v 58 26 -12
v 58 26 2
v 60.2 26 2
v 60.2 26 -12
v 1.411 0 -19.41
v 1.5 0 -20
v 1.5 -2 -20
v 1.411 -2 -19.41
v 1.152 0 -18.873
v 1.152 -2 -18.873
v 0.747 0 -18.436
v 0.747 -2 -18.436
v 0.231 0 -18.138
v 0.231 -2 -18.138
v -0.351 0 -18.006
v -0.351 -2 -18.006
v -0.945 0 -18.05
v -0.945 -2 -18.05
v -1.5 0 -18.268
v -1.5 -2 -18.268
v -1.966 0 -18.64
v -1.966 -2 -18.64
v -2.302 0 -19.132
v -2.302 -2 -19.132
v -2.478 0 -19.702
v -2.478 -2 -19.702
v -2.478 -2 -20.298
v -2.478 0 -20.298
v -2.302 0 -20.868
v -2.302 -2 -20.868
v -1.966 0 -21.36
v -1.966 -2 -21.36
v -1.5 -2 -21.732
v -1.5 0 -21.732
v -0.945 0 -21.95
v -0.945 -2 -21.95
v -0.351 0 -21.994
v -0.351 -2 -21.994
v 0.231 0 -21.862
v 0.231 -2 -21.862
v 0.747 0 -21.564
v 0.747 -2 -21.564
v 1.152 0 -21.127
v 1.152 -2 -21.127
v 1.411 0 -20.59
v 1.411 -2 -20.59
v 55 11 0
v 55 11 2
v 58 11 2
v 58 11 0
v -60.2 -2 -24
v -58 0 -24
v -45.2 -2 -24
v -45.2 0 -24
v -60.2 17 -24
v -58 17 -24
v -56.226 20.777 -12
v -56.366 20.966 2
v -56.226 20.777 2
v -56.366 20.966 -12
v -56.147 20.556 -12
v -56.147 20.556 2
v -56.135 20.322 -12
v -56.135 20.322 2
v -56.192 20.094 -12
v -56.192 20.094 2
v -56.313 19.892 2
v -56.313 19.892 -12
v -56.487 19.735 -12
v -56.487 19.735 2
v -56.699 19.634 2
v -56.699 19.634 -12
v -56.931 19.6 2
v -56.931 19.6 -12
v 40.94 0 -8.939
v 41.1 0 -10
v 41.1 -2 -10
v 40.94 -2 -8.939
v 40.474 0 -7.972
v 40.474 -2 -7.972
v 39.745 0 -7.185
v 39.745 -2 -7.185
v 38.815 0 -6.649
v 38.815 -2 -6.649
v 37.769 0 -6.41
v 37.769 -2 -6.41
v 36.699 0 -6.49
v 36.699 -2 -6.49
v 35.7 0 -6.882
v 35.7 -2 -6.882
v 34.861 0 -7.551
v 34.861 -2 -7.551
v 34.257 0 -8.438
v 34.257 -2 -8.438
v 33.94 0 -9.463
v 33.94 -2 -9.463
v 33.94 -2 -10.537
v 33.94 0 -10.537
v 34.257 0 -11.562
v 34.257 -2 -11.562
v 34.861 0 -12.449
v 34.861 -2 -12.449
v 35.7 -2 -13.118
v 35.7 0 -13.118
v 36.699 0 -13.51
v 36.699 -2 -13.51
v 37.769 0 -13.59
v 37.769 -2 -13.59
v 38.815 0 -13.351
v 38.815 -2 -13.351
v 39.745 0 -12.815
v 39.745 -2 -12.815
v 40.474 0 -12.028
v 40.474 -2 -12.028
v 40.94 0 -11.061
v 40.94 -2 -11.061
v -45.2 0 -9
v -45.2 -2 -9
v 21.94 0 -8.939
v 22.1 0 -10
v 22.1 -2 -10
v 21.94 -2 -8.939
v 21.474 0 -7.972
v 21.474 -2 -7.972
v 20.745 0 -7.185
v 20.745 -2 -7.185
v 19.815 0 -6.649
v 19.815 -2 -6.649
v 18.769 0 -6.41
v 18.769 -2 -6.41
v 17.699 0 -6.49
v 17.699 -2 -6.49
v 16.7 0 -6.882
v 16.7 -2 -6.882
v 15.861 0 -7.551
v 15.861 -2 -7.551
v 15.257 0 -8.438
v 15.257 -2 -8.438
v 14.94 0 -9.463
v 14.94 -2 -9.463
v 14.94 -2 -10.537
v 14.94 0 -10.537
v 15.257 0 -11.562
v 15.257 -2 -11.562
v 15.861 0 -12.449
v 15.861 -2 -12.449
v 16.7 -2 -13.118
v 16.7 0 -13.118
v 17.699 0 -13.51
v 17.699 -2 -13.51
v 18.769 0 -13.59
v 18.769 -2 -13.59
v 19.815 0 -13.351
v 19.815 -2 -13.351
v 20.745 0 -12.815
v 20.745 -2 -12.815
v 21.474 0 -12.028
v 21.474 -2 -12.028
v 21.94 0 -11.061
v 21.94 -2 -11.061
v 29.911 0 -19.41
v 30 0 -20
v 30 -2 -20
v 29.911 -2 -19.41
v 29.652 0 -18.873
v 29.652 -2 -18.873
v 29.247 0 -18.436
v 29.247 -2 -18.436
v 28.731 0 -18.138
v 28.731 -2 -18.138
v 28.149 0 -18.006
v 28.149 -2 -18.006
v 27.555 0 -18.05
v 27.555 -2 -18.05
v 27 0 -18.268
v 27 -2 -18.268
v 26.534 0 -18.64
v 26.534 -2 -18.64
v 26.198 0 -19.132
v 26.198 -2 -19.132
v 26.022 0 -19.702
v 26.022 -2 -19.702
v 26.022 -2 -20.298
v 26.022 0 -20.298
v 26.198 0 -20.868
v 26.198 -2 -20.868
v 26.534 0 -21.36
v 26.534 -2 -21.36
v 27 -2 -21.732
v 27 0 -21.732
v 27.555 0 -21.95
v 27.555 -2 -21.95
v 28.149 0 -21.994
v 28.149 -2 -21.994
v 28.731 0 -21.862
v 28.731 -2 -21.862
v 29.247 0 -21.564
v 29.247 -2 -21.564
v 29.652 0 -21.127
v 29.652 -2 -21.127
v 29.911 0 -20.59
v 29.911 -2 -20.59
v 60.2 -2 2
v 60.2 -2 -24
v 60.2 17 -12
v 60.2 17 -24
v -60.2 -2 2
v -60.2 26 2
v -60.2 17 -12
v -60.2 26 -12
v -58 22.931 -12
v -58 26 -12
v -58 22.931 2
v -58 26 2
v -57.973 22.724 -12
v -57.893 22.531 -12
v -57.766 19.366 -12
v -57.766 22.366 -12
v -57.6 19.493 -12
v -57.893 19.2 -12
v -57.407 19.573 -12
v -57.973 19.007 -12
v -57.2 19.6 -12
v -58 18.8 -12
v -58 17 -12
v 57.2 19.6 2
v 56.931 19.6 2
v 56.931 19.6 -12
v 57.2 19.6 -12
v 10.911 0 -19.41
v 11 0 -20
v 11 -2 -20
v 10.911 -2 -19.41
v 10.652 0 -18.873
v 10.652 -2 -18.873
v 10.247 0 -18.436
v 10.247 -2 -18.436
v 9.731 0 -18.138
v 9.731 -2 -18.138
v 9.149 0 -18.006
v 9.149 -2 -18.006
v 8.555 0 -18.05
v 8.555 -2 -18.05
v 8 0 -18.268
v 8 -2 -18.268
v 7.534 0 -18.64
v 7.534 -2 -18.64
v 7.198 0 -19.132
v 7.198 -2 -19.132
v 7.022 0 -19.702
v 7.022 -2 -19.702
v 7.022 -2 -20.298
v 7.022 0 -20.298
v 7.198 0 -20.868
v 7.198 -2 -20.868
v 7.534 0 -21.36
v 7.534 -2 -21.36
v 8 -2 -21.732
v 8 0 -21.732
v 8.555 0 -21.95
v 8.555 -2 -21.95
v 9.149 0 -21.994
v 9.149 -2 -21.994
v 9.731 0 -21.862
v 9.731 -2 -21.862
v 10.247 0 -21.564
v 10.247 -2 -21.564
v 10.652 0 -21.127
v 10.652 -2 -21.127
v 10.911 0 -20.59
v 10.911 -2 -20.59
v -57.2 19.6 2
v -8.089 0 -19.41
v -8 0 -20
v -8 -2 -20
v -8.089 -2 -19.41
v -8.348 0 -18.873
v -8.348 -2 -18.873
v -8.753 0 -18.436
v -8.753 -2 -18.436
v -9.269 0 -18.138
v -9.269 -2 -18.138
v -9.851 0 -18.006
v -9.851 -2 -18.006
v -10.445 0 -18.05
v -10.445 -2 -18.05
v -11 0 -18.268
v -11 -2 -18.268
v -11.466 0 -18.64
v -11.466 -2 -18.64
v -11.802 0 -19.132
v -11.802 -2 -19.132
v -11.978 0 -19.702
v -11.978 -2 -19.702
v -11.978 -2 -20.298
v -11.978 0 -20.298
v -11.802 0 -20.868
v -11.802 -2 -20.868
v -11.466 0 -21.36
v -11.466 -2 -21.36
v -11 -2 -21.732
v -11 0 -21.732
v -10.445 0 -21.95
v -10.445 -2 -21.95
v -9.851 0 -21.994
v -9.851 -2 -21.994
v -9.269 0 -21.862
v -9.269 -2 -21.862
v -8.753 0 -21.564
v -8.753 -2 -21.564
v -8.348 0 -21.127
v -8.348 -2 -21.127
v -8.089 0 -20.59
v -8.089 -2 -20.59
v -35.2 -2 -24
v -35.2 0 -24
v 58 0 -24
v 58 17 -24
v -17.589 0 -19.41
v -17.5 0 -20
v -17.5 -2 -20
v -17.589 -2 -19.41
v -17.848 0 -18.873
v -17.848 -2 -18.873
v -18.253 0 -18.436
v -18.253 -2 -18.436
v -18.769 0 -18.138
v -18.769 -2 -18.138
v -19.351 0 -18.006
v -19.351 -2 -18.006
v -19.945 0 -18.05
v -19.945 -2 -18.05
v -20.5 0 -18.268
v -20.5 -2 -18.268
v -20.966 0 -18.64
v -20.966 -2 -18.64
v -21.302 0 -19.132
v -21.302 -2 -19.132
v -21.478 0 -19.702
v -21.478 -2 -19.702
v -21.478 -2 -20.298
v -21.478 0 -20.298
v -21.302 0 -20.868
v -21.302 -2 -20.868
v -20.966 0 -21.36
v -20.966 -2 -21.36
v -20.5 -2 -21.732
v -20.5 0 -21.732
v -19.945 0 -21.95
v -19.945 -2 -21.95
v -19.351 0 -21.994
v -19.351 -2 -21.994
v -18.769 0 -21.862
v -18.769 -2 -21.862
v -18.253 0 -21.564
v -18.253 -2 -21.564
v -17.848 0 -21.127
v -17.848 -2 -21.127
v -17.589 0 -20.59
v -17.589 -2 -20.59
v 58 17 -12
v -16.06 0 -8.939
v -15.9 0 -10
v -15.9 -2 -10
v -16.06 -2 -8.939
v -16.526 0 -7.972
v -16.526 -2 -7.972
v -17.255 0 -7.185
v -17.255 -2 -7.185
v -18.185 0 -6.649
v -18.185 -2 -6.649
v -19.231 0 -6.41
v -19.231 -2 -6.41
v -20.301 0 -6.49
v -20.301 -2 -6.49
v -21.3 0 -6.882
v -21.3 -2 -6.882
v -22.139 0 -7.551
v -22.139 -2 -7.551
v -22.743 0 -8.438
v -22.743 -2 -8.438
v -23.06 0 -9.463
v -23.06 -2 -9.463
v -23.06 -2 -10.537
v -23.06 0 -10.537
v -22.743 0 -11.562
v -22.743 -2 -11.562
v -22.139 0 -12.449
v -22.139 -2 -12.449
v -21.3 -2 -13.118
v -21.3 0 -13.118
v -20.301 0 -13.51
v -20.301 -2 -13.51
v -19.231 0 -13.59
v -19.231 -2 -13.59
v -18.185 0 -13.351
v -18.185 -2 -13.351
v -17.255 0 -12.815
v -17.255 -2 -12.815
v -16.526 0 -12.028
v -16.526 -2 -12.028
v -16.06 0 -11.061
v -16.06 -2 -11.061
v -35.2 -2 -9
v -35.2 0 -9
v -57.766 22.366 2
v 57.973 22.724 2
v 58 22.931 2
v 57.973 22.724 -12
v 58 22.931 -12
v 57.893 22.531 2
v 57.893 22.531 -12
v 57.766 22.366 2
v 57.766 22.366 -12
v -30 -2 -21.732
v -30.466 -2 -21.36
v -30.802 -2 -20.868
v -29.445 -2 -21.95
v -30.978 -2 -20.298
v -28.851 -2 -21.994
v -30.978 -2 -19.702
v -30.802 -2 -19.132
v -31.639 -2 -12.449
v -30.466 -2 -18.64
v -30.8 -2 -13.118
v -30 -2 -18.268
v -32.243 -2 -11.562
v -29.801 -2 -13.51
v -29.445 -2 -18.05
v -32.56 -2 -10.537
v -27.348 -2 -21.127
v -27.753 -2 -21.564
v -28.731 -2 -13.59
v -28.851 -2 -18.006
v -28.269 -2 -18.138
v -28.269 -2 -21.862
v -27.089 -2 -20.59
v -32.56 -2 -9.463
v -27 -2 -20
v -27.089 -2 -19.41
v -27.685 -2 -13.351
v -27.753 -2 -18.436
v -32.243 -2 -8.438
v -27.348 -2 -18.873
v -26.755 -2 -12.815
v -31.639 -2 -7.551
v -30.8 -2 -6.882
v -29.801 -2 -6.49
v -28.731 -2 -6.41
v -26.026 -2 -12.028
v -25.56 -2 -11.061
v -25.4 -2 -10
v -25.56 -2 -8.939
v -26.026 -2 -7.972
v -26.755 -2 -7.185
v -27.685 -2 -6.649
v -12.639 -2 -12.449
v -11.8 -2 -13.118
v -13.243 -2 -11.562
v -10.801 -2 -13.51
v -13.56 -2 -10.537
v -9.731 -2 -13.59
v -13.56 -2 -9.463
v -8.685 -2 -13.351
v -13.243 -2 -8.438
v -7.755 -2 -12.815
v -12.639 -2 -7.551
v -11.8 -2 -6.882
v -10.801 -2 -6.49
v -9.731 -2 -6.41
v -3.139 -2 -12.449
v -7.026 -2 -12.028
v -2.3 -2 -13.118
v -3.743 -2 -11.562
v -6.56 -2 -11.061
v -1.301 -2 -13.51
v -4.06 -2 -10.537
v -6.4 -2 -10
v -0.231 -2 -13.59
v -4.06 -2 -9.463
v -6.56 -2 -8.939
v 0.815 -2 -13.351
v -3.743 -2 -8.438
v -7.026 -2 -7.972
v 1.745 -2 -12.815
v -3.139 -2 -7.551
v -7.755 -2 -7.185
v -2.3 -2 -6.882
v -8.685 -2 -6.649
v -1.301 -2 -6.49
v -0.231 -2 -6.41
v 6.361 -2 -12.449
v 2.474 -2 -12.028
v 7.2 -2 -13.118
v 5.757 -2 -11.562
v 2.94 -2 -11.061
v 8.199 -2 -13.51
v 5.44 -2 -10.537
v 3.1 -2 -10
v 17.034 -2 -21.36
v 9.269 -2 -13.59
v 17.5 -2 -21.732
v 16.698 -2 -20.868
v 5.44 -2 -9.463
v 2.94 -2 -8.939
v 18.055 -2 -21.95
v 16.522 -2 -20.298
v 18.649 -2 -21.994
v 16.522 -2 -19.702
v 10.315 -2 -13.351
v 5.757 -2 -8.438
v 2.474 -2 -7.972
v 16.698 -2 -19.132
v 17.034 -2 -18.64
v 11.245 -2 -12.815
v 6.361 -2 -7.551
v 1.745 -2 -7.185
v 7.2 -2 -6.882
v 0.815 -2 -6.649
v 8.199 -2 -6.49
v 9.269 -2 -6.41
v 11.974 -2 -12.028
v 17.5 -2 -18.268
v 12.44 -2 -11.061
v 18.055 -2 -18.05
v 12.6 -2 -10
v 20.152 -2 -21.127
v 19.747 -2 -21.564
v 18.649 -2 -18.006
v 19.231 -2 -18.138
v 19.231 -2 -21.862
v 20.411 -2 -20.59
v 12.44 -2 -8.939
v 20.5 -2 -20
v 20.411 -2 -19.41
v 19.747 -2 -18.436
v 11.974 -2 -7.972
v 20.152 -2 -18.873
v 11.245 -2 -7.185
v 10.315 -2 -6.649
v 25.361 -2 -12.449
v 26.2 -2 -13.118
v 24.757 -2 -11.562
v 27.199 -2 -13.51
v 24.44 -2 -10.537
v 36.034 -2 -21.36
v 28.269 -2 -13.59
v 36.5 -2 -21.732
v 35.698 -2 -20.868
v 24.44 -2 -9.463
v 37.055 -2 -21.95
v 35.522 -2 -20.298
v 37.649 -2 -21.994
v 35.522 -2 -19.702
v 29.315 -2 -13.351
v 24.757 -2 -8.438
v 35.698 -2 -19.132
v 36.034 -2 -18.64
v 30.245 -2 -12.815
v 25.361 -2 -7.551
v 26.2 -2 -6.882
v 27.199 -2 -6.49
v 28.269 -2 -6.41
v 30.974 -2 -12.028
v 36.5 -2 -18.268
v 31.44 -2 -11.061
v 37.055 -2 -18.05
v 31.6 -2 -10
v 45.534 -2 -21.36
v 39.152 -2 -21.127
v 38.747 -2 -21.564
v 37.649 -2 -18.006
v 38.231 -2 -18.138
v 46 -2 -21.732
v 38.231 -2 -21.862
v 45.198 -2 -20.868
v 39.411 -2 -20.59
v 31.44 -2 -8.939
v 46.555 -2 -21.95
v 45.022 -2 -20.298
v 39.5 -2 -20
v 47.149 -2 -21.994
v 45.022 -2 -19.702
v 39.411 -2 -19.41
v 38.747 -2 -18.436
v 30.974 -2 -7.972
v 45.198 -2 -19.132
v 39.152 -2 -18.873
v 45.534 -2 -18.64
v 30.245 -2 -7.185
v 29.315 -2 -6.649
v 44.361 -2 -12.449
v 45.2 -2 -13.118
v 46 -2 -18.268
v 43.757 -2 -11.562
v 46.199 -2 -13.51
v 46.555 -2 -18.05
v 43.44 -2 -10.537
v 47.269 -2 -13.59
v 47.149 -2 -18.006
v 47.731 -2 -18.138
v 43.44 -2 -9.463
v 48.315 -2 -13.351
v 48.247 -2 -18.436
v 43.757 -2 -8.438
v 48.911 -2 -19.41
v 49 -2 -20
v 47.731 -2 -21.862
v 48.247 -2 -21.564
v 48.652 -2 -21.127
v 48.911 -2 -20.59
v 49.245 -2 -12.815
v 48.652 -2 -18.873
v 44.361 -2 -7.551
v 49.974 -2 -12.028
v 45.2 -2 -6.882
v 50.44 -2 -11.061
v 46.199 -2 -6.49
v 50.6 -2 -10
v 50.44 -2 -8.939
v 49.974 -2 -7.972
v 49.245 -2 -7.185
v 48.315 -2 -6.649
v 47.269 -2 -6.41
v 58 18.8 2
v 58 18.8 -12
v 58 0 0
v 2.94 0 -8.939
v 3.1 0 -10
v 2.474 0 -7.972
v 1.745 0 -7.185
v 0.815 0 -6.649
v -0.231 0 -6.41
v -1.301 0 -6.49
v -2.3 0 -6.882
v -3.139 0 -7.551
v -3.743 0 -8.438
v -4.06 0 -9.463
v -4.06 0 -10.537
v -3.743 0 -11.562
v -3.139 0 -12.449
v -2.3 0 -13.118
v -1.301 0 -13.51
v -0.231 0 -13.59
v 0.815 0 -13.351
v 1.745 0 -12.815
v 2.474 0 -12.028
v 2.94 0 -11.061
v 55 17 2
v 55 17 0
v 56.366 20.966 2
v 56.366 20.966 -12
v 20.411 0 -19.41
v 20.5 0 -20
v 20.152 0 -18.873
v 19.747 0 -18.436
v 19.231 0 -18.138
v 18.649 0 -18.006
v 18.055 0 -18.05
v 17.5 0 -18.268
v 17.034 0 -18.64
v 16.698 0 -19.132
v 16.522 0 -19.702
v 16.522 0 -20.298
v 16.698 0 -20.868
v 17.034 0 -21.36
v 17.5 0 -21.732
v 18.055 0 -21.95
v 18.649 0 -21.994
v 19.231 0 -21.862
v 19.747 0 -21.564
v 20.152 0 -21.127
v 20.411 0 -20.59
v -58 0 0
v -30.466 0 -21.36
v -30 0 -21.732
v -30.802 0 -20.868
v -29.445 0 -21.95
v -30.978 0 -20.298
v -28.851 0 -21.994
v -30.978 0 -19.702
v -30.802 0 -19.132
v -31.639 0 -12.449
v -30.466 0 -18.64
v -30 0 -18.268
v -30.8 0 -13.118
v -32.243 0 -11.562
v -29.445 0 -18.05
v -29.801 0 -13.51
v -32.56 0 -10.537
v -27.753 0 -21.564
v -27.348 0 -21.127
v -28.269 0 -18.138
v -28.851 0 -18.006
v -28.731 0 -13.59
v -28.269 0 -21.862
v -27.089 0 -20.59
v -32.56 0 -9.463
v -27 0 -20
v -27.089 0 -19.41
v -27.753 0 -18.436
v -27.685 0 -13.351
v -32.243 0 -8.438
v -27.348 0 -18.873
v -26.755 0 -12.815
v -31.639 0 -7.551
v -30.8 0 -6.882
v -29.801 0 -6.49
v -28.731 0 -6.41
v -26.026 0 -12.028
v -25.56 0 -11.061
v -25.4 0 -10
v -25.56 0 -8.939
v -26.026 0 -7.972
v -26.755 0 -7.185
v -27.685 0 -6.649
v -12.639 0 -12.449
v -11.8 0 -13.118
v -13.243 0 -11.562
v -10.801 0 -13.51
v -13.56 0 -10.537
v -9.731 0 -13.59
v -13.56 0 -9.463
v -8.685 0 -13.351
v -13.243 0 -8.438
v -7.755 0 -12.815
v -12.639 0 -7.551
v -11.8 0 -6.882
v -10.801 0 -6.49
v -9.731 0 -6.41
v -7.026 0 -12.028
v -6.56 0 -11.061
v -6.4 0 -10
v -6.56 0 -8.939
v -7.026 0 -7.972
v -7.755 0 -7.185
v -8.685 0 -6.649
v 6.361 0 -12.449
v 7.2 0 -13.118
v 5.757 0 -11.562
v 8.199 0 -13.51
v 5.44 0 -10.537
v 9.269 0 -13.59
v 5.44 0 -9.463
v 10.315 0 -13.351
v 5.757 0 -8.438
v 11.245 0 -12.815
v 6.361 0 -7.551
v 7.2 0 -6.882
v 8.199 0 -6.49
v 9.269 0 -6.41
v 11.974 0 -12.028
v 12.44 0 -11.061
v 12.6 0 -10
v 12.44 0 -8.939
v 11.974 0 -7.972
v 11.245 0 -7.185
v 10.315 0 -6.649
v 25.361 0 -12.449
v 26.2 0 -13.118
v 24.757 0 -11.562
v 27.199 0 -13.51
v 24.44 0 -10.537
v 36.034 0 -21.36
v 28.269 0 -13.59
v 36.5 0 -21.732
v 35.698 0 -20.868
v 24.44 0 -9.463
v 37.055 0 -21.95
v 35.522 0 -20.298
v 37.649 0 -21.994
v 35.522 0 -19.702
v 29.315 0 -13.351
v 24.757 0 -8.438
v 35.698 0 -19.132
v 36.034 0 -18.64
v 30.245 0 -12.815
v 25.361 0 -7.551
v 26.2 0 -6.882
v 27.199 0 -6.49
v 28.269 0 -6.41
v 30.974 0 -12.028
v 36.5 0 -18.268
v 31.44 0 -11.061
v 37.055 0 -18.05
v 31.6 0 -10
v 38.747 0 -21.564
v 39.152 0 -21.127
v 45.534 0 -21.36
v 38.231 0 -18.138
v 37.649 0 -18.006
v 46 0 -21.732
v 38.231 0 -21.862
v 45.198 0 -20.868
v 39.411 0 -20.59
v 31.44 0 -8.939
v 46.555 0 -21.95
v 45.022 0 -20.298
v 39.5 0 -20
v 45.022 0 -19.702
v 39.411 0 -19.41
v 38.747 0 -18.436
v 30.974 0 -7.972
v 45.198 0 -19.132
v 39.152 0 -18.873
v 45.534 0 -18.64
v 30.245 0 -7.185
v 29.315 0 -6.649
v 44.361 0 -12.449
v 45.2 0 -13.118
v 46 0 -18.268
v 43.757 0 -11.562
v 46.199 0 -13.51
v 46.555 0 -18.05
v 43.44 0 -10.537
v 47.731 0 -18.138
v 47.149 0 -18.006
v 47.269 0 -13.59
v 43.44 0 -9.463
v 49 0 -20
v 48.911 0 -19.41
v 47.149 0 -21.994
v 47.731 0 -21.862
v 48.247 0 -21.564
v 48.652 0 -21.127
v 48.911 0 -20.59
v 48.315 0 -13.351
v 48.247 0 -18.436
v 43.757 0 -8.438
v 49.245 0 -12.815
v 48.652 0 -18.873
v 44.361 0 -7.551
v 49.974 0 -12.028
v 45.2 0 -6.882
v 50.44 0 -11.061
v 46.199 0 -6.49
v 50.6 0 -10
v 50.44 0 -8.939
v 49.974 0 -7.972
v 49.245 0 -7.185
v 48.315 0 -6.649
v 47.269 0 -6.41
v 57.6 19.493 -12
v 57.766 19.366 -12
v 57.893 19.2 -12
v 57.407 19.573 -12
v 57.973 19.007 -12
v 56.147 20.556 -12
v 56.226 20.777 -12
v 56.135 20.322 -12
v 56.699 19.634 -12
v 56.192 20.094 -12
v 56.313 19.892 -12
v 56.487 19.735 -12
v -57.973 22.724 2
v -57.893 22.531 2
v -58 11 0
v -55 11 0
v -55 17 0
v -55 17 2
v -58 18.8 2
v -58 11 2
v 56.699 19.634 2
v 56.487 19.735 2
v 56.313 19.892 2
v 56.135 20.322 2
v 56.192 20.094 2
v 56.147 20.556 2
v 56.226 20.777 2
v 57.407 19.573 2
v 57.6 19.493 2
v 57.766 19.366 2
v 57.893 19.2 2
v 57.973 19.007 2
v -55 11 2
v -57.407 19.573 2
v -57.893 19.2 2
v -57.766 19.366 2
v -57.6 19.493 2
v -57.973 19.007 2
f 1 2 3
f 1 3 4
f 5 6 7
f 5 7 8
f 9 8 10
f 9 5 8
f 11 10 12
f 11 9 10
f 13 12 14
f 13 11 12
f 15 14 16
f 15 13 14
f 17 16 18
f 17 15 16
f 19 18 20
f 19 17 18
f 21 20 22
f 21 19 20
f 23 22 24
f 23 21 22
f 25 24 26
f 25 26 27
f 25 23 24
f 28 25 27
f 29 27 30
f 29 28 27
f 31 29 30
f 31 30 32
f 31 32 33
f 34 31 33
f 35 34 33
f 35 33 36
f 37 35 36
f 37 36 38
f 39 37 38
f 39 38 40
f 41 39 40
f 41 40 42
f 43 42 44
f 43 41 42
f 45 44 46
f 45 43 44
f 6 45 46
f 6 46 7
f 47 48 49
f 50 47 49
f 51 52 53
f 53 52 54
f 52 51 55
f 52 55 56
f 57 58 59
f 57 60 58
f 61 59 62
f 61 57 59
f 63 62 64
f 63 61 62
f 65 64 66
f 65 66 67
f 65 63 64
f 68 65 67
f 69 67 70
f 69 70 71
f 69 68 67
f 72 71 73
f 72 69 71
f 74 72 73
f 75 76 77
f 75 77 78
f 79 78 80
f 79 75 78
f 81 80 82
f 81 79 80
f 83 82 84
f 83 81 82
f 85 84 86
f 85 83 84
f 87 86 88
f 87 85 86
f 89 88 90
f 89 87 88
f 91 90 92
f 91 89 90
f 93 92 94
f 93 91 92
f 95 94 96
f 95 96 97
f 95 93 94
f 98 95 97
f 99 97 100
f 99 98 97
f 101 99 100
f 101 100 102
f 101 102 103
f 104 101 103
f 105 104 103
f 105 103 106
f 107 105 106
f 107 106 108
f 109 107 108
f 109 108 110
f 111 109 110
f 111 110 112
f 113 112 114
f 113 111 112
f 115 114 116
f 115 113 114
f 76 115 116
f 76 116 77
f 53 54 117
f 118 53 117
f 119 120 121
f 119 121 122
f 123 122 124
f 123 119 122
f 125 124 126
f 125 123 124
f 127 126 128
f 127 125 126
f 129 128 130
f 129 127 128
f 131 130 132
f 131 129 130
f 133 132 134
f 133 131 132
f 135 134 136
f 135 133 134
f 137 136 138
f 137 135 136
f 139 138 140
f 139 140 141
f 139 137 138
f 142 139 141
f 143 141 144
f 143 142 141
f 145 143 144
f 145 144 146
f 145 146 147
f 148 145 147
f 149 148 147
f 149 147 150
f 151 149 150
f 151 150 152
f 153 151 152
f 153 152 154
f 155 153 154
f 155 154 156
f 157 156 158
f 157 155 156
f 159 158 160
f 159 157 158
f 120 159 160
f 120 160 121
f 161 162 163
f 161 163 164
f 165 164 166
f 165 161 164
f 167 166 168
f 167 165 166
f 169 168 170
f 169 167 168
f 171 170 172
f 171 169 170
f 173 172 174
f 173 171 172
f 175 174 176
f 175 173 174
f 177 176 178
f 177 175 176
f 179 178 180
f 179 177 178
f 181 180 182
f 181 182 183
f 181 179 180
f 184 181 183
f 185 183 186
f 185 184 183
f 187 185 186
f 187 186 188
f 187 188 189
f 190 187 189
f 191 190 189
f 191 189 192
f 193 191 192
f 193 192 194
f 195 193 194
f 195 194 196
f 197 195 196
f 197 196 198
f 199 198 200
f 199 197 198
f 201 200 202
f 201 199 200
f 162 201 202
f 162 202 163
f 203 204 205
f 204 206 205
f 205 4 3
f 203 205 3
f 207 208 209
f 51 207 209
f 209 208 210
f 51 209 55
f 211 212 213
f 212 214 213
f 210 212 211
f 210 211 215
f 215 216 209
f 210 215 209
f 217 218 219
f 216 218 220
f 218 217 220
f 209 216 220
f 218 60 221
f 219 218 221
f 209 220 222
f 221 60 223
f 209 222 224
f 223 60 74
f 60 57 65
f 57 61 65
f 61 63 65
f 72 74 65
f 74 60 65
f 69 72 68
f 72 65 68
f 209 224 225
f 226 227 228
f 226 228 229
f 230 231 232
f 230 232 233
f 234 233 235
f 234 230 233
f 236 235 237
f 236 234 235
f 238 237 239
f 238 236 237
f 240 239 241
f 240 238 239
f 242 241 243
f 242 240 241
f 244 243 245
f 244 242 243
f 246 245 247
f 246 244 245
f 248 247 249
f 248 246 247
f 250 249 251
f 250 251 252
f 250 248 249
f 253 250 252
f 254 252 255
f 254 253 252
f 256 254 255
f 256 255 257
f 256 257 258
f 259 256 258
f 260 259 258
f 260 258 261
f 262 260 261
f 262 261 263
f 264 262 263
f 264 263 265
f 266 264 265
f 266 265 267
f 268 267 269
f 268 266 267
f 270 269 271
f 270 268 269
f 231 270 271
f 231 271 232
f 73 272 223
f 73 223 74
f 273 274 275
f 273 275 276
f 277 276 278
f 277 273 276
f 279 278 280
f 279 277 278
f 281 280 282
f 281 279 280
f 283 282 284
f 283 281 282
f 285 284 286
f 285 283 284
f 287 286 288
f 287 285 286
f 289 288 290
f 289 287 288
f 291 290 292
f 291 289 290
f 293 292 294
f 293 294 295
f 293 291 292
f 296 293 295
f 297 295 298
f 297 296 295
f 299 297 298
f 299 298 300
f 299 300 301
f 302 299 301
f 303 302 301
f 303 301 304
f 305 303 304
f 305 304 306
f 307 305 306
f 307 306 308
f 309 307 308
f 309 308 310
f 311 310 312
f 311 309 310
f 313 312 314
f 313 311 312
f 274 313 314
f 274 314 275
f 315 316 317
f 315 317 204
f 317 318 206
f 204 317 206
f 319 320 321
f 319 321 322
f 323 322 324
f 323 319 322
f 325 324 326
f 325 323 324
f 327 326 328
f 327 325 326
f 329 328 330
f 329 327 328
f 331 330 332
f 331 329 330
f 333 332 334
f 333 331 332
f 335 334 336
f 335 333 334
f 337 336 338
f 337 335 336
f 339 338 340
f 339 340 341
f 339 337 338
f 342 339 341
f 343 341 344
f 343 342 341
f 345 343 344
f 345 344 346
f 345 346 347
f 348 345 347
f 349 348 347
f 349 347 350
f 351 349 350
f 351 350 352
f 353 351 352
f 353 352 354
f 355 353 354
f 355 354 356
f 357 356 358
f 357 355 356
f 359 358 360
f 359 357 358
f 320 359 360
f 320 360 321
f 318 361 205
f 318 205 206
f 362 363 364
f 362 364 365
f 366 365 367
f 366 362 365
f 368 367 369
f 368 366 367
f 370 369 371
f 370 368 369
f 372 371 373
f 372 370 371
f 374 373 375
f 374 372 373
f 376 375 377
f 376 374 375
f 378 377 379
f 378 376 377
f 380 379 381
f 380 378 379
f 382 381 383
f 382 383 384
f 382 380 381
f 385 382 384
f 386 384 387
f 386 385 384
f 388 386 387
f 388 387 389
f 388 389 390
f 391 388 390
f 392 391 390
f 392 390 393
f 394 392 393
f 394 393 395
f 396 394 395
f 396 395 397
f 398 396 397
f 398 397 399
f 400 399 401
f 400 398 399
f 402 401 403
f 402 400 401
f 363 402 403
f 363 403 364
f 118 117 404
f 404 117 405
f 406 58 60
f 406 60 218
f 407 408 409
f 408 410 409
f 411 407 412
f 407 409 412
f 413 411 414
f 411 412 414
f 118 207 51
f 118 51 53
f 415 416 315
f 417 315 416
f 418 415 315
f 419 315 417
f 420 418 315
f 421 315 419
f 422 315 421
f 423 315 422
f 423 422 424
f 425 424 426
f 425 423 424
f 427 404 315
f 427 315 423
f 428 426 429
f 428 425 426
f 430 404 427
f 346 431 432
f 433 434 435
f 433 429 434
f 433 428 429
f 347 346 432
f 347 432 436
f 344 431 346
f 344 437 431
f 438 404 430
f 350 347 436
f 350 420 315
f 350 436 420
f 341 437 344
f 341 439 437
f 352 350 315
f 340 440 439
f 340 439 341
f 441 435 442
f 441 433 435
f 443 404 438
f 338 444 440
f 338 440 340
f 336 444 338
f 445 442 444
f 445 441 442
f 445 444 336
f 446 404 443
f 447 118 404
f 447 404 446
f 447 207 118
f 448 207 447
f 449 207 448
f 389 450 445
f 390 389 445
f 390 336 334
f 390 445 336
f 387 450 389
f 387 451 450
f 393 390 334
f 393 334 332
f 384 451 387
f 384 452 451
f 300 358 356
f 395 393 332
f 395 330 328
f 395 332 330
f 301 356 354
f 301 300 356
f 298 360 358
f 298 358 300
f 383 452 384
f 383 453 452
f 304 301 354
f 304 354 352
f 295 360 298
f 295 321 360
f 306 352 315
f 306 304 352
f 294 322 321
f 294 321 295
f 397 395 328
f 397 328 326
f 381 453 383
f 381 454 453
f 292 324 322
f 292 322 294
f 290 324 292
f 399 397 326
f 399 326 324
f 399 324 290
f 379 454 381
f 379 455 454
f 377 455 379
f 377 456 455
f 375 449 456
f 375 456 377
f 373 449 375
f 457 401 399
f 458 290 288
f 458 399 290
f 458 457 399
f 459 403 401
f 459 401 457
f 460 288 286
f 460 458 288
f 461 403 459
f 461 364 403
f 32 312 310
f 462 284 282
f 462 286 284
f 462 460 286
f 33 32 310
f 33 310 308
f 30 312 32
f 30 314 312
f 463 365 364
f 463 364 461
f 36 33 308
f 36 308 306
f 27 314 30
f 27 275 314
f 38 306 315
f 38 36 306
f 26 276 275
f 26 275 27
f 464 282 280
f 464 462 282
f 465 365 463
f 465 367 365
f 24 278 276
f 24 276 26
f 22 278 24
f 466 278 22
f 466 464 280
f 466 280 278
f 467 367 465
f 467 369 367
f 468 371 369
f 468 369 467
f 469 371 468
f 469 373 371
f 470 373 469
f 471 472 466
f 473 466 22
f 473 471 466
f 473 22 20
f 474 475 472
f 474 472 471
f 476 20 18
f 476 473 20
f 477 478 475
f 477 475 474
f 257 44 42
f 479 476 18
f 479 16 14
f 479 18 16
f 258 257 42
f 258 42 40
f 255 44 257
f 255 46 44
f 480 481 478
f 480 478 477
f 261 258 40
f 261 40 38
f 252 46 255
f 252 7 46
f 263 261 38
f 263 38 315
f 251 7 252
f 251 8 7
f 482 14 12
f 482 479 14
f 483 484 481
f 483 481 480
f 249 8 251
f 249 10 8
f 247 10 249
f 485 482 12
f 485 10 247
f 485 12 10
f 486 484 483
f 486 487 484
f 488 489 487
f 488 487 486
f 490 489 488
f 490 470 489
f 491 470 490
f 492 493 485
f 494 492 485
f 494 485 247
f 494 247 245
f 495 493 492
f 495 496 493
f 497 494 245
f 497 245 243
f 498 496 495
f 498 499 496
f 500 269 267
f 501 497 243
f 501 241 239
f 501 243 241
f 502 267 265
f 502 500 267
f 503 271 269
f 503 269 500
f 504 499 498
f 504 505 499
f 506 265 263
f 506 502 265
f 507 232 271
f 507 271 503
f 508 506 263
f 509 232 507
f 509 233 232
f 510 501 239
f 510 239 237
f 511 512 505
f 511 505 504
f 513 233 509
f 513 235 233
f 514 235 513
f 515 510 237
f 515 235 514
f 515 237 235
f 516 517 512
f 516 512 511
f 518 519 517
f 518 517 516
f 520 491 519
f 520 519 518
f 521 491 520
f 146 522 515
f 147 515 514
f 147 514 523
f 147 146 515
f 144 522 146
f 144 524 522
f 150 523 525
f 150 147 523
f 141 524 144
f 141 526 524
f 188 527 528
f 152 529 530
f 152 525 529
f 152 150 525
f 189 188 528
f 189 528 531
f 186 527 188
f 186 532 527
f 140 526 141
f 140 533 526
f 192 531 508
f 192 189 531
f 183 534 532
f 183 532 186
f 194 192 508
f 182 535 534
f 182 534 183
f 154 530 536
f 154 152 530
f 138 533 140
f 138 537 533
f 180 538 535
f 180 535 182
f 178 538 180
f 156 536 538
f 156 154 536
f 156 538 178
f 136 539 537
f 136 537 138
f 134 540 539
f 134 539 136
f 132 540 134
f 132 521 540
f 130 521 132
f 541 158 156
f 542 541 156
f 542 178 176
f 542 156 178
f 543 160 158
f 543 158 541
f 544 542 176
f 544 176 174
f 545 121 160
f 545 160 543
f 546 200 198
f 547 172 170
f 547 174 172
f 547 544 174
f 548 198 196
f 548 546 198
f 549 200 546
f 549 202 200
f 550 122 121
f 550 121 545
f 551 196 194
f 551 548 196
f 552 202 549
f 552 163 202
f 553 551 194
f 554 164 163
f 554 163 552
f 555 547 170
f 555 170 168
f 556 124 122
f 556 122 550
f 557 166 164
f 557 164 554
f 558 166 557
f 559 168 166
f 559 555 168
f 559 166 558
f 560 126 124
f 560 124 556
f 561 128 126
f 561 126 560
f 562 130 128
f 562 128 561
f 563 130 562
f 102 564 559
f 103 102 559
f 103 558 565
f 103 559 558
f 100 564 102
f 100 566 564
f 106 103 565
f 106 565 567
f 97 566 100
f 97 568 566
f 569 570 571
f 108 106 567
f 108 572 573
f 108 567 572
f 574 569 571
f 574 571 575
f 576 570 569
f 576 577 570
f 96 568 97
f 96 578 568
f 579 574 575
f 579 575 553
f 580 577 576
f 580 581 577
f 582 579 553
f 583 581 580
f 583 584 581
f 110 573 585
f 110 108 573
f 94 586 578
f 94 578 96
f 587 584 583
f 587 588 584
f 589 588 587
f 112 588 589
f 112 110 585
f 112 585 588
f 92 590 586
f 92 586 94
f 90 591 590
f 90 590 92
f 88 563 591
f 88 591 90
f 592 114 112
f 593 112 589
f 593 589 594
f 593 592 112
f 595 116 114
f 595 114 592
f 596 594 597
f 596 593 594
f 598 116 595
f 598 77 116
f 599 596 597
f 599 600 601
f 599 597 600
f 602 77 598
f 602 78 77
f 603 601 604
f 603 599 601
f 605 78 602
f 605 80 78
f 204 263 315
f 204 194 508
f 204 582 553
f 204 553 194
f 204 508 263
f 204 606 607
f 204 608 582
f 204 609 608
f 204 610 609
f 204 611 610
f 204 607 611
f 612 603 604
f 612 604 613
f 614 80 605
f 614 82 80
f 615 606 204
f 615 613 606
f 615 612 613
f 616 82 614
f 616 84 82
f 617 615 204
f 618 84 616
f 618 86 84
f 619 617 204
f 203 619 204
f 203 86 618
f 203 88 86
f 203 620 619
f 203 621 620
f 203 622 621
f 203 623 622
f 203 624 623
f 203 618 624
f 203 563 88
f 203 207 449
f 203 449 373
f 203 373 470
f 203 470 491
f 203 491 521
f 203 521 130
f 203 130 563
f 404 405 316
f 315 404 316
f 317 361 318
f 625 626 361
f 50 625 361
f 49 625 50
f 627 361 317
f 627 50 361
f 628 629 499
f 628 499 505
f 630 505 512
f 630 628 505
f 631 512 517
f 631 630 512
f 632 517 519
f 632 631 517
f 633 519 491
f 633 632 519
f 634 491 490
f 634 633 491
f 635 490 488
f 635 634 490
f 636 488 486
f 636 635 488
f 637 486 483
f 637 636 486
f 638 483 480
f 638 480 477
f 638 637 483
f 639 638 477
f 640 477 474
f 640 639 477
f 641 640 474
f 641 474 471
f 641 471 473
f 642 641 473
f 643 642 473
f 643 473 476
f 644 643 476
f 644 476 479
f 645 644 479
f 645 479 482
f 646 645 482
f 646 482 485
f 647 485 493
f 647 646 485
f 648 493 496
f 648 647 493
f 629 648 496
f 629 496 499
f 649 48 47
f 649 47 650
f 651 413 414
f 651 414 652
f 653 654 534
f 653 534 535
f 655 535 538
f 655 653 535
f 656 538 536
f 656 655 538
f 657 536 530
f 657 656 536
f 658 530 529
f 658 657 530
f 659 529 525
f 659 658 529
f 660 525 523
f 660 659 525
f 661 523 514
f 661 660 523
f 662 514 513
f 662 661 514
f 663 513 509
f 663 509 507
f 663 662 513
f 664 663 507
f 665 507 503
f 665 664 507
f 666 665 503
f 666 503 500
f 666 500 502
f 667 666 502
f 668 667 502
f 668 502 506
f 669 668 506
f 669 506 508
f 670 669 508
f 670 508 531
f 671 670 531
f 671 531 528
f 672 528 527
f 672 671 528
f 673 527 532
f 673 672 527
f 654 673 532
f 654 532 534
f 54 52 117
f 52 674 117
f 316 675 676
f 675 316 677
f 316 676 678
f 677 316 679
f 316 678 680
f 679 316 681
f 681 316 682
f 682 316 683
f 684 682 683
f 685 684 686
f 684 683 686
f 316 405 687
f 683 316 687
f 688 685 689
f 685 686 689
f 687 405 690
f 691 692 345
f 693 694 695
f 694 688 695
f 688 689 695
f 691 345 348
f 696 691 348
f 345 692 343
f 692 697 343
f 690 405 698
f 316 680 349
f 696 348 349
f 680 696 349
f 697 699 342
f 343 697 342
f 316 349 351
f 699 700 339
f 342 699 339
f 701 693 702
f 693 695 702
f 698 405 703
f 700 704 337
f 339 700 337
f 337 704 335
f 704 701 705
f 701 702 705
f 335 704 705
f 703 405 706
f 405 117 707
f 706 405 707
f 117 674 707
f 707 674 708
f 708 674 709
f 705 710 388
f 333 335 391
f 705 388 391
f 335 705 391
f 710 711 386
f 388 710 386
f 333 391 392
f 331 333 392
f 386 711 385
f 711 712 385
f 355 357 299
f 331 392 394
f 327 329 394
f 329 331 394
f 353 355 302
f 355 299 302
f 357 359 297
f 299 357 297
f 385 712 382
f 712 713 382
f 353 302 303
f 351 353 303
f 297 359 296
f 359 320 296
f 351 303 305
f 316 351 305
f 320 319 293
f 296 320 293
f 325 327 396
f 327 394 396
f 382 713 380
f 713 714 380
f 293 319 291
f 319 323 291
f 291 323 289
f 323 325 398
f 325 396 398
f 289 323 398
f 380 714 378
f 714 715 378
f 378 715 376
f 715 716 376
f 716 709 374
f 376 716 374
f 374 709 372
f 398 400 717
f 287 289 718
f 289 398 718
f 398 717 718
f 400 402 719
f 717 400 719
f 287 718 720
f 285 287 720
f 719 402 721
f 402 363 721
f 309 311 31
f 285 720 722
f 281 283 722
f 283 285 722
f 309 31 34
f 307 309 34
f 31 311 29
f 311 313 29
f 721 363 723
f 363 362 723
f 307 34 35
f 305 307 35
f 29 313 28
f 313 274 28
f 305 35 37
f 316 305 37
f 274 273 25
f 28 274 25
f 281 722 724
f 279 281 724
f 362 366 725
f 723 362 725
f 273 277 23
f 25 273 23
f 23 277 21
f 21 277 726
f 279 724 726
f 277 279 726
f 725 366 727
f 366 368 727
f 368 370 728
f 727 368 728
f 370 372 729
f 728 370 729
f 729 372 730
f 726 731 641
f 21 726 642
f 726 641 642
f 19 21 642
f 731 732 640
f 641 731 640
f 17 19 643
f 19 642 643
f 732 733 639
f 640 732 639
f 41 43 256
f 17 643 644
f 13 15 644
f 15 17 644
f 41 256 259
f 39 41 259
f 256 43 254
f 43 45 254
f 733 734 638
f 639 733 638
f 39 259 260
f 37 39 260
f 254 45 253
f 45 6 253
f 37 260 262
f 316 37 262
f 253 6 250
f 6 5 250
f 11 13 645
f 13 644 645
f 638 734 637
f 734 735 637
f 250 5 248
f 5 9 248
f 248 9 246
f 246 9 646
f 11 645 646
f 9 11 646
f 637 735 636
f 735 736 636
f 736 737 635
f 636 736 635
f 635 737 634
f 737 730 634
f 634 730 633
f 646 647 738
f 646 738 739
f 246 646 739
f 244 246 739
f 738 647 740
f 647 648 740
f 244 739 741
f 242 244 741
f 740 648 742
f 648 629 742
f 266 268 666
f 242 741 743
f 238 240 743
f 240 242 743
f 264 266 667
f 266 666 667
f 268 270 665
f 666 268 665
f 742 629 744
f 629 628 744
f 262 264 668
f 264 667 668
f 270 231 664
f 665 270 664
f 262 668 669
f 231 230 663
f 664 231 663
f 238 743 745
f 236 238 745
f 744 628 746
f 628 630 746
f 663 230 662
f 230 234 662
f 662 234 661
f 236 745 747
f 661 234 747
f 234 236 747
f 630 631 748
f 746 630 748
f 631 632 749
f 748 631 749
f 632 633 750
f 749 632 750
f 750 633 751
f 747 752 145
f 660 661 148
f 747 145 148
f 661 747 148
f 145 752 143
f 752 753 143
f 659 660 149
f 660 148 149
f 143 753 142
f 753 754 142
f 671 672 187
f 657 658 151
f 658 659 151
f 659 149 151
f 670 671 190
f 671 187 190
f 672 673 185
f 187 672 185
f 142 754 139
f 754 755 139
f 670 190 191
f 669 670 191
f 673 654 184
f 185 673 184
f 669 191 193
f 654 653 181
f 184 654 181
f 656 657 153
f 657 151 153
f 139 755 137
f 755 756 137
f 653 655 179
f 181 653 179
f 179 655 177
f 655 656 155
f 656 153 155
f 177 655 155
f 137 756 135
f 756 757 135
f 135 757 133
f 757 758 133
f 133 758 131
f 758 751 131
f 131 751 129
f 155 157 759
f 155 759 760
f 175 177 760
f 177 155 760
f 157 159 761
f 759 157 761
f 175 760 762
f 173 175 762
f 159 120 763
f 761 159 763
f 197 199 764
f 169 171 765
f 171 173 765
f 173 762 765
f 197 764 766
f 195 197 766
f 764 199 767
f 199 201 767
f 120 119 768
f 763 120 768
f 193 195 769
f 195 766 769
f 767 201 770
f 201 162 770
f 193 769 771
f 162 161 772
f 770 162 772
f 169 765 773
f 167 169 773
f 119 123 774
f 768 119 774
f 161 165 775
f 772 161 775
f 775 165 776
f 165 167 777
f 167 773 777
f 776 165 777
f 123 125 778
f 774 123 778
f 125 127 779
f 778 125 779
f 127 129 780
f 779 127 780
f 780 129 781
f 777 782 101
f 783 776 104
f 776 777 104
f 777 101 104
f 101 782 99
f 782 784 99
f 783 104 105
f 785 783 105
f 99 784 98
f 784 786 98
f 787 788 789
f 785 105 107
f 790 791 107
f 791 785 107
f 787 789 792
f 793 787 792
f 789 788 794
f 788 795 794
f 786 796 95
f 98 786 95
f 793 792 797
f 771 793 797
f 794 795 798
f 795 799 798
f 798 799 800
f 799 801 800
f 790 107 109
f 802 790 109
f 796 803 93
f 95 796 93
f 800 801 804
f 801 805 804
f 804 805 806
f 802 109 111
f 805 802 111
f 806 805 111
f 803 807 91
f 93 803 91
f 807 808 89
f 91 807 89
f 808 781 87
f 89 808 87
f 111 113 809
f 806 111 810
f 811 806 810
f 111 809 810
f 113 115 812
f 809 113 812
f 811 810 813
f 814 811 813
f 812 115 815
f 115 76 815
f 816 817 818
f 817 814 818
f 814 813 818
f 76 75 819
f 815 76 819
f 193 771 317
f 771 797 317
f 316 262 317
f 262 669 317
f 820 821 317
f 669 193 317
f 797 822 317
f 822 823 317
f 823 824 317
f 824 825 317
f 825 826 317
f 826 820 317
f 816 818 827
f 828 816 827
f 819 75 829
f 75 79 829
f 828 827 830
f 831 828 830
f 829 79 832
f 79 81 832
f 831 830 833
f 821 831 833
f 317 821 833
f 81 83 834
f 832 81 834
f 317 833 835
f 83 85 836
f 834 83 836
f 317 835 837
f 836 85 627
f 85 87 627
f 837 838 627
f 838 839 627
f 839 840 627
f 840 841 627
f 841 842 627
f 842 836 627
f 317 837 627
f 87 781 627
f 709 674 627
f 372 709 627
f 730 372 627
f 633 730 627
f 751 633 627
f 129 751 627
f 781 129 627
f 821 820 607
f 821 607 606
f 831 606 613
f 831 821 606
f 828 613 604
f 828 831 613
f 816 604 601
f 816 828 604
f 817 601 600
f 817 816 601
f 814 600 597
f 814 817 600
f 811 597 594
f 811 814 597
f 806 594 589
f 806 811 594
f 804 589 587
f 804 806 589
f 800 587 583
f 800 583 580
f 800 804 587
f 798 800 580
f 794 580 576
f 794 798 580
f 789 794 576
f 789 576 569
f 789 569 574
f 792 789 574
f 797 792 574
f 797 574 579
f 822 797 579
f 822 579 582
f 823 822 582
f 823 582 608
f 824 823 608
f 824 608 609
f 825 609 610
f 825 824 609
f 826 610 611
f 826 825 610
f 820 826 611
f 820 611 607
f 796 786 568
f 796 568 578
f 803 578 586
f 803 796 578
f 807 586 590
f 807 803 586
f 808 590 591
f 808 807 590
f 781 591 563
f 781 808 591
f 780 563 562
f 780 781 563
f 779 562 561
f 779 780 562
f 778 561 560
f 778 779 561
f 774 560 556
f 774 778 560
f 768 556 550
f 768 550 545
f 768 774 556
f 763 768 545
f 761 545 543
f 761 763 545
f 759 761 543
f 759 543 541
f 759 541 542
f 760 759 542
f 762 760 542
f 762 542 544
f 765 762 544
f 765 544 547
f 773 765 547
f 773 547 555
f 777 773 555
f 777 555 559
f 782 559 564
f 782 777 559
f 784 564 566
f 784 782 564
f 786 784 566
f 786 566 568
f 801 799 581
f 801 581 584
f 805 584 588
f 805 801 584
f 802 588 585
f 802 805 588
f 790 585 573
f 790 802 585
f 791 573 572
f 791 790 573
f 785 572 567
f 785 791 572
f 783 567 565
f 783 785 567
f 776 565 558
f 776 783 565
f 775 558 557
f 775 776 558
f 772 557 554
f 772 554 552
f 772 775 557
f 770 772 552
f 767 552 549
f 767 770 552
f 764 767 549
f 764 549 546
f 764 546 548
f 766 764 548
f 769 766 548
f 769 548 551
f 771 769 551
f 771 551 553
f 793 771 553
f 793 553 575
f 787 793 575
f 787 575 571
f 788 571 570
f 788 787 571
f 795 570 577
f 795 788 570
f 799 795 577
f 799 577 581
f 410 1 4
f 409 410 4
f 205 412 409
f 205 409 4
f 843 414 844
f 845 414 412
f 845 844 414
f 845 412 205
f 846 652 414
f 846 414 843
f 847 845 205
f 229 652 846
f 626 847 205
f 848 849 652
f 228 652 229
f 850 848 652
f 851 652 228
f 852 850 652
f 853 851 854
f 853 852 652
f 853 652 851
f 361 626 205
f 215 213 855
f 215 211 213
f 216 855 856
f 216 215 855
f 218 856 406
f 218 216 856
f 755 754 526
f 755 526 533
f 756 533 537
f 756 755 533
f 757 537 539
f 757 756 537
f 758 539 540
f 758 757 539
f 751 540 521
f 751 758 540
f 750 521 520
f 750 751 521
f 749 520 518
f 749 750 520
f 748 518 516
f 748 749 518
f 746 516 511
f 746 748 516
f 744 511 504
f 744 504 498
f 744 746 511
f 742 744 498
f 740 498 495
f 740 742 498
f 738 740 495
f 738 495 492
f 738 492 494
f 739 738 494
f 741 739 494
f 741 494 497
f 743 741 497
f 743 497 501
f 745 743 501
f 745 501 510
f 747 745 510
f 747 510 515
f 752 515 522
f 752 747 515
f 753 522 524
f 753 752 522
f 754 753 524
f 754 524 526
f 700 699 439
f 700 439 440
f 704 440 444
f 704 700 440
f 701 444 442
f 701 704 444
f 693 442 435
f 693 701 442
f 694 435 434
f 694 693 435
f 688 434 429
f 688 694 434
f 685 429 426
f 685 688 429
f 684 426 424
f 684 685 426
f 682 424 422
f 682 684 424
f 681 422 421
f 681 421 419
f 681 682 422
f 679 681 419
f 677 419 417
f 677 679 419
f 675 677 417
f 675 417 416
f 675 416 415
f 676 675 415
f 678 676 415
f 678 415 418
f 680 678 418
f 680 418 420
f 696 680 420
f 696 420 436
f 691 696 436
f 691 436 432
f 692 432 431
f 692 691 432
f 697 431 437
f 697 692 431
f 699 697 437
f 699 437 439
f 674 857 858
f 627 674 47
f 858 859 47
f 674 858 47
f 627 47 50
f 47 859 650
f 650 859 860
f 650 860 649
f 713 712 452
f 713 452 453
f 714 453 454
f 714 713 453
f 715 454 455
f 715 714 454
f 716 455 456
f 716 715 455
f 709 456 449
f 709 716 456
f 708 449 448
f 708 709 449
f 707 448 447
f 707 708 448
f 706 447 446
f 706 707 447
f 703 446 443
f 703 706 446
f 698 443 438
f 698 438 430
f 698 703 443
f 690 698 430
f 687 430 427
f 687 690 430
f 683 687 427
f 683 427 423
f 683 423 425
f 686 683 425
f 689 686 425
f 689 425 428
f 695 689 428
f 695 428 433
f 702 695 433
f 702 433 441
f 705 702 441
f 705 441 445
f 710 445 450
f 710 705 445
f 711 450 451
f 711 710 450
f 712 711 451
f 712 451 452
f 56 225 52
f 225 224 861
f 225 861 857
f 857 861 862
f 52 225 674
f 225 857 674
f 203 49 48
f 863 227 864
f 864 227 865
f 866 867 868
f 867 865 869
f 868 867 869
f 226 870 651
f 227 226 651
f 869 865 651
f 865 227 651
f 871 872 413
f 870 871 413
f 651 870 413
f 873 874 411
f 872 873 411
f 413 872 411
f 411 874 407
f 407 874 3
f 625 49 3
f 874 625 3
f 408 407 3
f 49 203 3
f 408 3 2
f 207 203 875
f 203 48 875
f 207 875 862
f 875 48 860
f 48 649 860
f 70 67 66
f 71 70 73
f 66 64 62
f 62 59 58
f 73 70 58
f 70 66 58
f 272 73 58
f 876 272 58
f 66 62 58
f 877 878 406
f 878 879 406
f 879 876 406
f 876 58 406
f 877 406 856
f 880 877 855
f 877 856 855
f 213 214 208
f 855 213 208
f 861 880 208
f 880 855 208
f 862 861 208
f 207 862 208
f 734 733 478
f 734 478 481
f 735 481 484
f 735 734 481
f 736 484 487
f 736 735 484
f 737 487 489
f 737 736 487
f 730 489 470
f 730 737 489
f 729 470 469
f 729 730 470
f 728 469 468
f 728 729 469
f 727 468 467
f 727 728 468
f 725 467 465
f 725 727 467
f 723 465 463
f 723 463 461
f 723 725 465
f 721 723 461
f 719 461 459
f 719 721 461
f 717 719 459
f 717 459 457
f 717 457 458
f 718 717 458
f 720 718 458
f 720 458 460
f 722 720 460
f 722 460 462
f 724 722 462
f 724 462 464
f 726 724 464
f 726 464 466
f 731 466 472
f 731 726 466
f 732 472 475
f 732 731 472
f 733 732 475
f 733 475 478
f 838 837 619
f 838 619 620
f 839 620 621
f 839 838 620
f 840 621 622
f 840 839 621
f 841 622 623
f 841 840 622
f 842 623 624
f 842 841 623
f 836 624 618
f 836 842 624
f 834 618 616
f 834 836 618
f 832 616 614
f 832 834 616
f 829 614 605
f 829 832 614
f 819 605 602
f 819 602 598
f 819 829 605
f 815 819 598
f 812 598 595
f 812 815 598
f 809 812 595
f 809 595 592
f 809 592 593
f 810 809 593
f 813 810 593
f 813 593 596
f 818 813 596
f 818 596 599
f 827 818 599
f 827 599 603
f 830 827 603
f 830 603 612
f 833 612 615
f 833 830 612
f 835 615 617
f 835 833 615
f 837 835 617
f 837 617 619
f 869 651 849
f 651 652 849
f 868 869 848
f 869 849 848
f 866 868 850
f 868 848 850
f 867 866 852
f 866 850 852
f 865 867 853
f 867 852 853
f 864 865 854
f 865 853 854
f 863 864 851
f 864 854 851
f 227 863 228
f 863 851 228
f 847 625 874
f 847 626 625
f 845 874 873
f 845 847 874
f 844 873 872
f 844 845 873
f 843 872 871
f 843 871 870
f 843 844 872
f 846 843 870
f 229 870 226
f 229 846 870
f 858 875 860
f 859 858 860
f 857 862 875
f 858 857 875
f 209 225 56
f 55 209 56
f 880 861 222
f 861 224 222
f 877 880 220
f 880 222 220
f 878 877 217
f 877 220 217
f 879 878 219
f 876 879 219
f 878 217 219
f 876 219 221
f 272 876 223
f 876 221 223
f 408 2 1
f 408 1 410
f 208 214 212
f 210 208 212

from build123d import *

# Parameters (mm, degrees)
F0_W      = 116
F0_H      = 17
F1_DEPTH  = 2
F2_W      = 17
F2_H      = 2
F3_DEPTH  = 2.2
F5_W      = 3
F5_H      = 6
F6_DEPTH  = 25
F8_DEPTH  = 14
F9_R      = 0.8
F10_R     = 2
F10_R_2   = 3.6
F11_DEPTH = 2


with BuildPart() as f1:
    # F0 (on Top) → F1 (new body)
    with BuildSketch(Plane.XY):
        with Locations((0, 8.5)):
            Rectangle(F0_W, F0_H)
    extrude(amount=F1_DEPTH)

    # F4: F3 across plane


with BuildPart() as f3:
    # F2 (on face) → F3 (new body)
    with BuildSketch(Plane(origin=(-58, 0, 0), x_dir=(0, -1, 0), z_dir=(-1, 0, 0))):
        Polygon((-17, 0), (-17, 2), (-26, 2), (-26, -12), (-17, -12), align=None)
        with Locations((-8.5, 1)):
            Rectangle(F2_W, F2_H)
        Polygon((0, 0), (-17, 0), (-17, -12), (-17, -24), (0, -24), align=None)
    extrude(amount=F3_DEPTH)


with BuildPart() as f1_1:
    add(f1.part)
    add(f3.part.mirror(Plane.YZ))

    # F5 (on face) → F6 (cut)
    with BuildSketch(Plane.XY.offset(2)):
        with Locations((-56.5, 14)):
            Rectangle(F5_W, F5_H)
        with Locations((56.5, 14)):
            Rectangle(F5_W, F5_H)
    extrude(amount=-F6_DEPTH, mode=Mode.SUBTRACT)


    add(f3.part)  # F8 merges F3
    # F7 (on face) → F8 (join, through all)
    with BuildSketch(Plane.XY.offset(2)):
        Polygon((-55, 19.6), (-58, 22.6), (-58, 19.6), align=None)
        Polygon((58, 19.6), (58, 22.6), (55, 19.6), align=None)
    extrude(amount=-F8_DEPTH)

    # F9
    f9_edges = [f1_1.edges().sort_by_distance(p)[0] for p in [
        (55, 19.6, -5),
        (-55, 19.6, -5),
        (58, 19.6, -5),
        (-58, 19.6, -5),
        (-58, 22.6, -5),
        (58, 22.6, -5),
    ]]
    fillet(f9_edges, radius=F9_R)

    # F10 (on face) → F11 (join)
    with BuildSketch(Plane.XZ):
        Polygon((-58, 0), (-58, -24), (-45.2, -24), (-45.2, -9), (-35.2, -9), (-35.2, -24), (58, -24), (58, 0), align=None)
        with Locations((-29, -20)):
            Circle(F10_R, mode=Mode.SUBTRACT)
        with Locations((-19.5, -20)):
            Circle(F10_R, mode=Mode.SUBTRACT)
        with Locations((-10, -20)):
            Circle(F10_R, mode=Mode.SUBTRACT)
        with Locations((-0.5, -20)):
            Circle(F10_R, mode=Mode.SUBTRACT)
        with Locations((9, -20)):
            Circle(F10_R, mode=Mode.SUBTRACT)
        with Locations((18.5, -20)):
            Circle(F10_R, mode=Mode.SUBTRACT)
        with Locations((28, -20)):
            Circle(F10_R, mode=Mode.SUBTRACT)
        with Locations((37.5, -20)):
            Circle(F10_R, mode=Mode.SUBTRACT)
        with Locations((47, -20)):
            Circle(F10_R, mode=Mode.SUBTRACT)
        with Locations((-29, -10)):
            Circle(F10_R_2, mode=Mode.SUBTRACT)
        with Locations((-19.5, -10)):
            Circle(F10_R_2, mode=Mode.SUBTRACT)
        with Locations((-10, -10)):
            Circle(F10_R_2, mode=Mode.SUBTRACT)
        with Locations((-0.5, -10)):
            Circle(F10_R_2, mode=Mode.SUBTRACT)
        with Locations((9, -10)):
            Circle(F10_R_2, mode=Mode.SUBTRACT)
        with Locations((18.5, -10)):
            Circle(F10_R_2, mode=Mode.SUBTRACT)
        with Locations((28, -10)):
            Circle(F10_R_2, mode=Mode.SUBTRACT)
        with Locations((37.5, -10)):
            Circle(F10_R_2, mode=Mode.SUBTRACT)
        with Locations((47, -10)):
            Circle(F10_R_2, mode=Mode.SUBTRACT)
        Polygon((60.2, 2), (-60.2, 2), (-60.2, -24), (-58, -24), (-58, 0), (58, 0), (58, -24), (60.2, -24), align=None)
    extrude(amount=F11_DEPTH)


solid = f1_1.part
